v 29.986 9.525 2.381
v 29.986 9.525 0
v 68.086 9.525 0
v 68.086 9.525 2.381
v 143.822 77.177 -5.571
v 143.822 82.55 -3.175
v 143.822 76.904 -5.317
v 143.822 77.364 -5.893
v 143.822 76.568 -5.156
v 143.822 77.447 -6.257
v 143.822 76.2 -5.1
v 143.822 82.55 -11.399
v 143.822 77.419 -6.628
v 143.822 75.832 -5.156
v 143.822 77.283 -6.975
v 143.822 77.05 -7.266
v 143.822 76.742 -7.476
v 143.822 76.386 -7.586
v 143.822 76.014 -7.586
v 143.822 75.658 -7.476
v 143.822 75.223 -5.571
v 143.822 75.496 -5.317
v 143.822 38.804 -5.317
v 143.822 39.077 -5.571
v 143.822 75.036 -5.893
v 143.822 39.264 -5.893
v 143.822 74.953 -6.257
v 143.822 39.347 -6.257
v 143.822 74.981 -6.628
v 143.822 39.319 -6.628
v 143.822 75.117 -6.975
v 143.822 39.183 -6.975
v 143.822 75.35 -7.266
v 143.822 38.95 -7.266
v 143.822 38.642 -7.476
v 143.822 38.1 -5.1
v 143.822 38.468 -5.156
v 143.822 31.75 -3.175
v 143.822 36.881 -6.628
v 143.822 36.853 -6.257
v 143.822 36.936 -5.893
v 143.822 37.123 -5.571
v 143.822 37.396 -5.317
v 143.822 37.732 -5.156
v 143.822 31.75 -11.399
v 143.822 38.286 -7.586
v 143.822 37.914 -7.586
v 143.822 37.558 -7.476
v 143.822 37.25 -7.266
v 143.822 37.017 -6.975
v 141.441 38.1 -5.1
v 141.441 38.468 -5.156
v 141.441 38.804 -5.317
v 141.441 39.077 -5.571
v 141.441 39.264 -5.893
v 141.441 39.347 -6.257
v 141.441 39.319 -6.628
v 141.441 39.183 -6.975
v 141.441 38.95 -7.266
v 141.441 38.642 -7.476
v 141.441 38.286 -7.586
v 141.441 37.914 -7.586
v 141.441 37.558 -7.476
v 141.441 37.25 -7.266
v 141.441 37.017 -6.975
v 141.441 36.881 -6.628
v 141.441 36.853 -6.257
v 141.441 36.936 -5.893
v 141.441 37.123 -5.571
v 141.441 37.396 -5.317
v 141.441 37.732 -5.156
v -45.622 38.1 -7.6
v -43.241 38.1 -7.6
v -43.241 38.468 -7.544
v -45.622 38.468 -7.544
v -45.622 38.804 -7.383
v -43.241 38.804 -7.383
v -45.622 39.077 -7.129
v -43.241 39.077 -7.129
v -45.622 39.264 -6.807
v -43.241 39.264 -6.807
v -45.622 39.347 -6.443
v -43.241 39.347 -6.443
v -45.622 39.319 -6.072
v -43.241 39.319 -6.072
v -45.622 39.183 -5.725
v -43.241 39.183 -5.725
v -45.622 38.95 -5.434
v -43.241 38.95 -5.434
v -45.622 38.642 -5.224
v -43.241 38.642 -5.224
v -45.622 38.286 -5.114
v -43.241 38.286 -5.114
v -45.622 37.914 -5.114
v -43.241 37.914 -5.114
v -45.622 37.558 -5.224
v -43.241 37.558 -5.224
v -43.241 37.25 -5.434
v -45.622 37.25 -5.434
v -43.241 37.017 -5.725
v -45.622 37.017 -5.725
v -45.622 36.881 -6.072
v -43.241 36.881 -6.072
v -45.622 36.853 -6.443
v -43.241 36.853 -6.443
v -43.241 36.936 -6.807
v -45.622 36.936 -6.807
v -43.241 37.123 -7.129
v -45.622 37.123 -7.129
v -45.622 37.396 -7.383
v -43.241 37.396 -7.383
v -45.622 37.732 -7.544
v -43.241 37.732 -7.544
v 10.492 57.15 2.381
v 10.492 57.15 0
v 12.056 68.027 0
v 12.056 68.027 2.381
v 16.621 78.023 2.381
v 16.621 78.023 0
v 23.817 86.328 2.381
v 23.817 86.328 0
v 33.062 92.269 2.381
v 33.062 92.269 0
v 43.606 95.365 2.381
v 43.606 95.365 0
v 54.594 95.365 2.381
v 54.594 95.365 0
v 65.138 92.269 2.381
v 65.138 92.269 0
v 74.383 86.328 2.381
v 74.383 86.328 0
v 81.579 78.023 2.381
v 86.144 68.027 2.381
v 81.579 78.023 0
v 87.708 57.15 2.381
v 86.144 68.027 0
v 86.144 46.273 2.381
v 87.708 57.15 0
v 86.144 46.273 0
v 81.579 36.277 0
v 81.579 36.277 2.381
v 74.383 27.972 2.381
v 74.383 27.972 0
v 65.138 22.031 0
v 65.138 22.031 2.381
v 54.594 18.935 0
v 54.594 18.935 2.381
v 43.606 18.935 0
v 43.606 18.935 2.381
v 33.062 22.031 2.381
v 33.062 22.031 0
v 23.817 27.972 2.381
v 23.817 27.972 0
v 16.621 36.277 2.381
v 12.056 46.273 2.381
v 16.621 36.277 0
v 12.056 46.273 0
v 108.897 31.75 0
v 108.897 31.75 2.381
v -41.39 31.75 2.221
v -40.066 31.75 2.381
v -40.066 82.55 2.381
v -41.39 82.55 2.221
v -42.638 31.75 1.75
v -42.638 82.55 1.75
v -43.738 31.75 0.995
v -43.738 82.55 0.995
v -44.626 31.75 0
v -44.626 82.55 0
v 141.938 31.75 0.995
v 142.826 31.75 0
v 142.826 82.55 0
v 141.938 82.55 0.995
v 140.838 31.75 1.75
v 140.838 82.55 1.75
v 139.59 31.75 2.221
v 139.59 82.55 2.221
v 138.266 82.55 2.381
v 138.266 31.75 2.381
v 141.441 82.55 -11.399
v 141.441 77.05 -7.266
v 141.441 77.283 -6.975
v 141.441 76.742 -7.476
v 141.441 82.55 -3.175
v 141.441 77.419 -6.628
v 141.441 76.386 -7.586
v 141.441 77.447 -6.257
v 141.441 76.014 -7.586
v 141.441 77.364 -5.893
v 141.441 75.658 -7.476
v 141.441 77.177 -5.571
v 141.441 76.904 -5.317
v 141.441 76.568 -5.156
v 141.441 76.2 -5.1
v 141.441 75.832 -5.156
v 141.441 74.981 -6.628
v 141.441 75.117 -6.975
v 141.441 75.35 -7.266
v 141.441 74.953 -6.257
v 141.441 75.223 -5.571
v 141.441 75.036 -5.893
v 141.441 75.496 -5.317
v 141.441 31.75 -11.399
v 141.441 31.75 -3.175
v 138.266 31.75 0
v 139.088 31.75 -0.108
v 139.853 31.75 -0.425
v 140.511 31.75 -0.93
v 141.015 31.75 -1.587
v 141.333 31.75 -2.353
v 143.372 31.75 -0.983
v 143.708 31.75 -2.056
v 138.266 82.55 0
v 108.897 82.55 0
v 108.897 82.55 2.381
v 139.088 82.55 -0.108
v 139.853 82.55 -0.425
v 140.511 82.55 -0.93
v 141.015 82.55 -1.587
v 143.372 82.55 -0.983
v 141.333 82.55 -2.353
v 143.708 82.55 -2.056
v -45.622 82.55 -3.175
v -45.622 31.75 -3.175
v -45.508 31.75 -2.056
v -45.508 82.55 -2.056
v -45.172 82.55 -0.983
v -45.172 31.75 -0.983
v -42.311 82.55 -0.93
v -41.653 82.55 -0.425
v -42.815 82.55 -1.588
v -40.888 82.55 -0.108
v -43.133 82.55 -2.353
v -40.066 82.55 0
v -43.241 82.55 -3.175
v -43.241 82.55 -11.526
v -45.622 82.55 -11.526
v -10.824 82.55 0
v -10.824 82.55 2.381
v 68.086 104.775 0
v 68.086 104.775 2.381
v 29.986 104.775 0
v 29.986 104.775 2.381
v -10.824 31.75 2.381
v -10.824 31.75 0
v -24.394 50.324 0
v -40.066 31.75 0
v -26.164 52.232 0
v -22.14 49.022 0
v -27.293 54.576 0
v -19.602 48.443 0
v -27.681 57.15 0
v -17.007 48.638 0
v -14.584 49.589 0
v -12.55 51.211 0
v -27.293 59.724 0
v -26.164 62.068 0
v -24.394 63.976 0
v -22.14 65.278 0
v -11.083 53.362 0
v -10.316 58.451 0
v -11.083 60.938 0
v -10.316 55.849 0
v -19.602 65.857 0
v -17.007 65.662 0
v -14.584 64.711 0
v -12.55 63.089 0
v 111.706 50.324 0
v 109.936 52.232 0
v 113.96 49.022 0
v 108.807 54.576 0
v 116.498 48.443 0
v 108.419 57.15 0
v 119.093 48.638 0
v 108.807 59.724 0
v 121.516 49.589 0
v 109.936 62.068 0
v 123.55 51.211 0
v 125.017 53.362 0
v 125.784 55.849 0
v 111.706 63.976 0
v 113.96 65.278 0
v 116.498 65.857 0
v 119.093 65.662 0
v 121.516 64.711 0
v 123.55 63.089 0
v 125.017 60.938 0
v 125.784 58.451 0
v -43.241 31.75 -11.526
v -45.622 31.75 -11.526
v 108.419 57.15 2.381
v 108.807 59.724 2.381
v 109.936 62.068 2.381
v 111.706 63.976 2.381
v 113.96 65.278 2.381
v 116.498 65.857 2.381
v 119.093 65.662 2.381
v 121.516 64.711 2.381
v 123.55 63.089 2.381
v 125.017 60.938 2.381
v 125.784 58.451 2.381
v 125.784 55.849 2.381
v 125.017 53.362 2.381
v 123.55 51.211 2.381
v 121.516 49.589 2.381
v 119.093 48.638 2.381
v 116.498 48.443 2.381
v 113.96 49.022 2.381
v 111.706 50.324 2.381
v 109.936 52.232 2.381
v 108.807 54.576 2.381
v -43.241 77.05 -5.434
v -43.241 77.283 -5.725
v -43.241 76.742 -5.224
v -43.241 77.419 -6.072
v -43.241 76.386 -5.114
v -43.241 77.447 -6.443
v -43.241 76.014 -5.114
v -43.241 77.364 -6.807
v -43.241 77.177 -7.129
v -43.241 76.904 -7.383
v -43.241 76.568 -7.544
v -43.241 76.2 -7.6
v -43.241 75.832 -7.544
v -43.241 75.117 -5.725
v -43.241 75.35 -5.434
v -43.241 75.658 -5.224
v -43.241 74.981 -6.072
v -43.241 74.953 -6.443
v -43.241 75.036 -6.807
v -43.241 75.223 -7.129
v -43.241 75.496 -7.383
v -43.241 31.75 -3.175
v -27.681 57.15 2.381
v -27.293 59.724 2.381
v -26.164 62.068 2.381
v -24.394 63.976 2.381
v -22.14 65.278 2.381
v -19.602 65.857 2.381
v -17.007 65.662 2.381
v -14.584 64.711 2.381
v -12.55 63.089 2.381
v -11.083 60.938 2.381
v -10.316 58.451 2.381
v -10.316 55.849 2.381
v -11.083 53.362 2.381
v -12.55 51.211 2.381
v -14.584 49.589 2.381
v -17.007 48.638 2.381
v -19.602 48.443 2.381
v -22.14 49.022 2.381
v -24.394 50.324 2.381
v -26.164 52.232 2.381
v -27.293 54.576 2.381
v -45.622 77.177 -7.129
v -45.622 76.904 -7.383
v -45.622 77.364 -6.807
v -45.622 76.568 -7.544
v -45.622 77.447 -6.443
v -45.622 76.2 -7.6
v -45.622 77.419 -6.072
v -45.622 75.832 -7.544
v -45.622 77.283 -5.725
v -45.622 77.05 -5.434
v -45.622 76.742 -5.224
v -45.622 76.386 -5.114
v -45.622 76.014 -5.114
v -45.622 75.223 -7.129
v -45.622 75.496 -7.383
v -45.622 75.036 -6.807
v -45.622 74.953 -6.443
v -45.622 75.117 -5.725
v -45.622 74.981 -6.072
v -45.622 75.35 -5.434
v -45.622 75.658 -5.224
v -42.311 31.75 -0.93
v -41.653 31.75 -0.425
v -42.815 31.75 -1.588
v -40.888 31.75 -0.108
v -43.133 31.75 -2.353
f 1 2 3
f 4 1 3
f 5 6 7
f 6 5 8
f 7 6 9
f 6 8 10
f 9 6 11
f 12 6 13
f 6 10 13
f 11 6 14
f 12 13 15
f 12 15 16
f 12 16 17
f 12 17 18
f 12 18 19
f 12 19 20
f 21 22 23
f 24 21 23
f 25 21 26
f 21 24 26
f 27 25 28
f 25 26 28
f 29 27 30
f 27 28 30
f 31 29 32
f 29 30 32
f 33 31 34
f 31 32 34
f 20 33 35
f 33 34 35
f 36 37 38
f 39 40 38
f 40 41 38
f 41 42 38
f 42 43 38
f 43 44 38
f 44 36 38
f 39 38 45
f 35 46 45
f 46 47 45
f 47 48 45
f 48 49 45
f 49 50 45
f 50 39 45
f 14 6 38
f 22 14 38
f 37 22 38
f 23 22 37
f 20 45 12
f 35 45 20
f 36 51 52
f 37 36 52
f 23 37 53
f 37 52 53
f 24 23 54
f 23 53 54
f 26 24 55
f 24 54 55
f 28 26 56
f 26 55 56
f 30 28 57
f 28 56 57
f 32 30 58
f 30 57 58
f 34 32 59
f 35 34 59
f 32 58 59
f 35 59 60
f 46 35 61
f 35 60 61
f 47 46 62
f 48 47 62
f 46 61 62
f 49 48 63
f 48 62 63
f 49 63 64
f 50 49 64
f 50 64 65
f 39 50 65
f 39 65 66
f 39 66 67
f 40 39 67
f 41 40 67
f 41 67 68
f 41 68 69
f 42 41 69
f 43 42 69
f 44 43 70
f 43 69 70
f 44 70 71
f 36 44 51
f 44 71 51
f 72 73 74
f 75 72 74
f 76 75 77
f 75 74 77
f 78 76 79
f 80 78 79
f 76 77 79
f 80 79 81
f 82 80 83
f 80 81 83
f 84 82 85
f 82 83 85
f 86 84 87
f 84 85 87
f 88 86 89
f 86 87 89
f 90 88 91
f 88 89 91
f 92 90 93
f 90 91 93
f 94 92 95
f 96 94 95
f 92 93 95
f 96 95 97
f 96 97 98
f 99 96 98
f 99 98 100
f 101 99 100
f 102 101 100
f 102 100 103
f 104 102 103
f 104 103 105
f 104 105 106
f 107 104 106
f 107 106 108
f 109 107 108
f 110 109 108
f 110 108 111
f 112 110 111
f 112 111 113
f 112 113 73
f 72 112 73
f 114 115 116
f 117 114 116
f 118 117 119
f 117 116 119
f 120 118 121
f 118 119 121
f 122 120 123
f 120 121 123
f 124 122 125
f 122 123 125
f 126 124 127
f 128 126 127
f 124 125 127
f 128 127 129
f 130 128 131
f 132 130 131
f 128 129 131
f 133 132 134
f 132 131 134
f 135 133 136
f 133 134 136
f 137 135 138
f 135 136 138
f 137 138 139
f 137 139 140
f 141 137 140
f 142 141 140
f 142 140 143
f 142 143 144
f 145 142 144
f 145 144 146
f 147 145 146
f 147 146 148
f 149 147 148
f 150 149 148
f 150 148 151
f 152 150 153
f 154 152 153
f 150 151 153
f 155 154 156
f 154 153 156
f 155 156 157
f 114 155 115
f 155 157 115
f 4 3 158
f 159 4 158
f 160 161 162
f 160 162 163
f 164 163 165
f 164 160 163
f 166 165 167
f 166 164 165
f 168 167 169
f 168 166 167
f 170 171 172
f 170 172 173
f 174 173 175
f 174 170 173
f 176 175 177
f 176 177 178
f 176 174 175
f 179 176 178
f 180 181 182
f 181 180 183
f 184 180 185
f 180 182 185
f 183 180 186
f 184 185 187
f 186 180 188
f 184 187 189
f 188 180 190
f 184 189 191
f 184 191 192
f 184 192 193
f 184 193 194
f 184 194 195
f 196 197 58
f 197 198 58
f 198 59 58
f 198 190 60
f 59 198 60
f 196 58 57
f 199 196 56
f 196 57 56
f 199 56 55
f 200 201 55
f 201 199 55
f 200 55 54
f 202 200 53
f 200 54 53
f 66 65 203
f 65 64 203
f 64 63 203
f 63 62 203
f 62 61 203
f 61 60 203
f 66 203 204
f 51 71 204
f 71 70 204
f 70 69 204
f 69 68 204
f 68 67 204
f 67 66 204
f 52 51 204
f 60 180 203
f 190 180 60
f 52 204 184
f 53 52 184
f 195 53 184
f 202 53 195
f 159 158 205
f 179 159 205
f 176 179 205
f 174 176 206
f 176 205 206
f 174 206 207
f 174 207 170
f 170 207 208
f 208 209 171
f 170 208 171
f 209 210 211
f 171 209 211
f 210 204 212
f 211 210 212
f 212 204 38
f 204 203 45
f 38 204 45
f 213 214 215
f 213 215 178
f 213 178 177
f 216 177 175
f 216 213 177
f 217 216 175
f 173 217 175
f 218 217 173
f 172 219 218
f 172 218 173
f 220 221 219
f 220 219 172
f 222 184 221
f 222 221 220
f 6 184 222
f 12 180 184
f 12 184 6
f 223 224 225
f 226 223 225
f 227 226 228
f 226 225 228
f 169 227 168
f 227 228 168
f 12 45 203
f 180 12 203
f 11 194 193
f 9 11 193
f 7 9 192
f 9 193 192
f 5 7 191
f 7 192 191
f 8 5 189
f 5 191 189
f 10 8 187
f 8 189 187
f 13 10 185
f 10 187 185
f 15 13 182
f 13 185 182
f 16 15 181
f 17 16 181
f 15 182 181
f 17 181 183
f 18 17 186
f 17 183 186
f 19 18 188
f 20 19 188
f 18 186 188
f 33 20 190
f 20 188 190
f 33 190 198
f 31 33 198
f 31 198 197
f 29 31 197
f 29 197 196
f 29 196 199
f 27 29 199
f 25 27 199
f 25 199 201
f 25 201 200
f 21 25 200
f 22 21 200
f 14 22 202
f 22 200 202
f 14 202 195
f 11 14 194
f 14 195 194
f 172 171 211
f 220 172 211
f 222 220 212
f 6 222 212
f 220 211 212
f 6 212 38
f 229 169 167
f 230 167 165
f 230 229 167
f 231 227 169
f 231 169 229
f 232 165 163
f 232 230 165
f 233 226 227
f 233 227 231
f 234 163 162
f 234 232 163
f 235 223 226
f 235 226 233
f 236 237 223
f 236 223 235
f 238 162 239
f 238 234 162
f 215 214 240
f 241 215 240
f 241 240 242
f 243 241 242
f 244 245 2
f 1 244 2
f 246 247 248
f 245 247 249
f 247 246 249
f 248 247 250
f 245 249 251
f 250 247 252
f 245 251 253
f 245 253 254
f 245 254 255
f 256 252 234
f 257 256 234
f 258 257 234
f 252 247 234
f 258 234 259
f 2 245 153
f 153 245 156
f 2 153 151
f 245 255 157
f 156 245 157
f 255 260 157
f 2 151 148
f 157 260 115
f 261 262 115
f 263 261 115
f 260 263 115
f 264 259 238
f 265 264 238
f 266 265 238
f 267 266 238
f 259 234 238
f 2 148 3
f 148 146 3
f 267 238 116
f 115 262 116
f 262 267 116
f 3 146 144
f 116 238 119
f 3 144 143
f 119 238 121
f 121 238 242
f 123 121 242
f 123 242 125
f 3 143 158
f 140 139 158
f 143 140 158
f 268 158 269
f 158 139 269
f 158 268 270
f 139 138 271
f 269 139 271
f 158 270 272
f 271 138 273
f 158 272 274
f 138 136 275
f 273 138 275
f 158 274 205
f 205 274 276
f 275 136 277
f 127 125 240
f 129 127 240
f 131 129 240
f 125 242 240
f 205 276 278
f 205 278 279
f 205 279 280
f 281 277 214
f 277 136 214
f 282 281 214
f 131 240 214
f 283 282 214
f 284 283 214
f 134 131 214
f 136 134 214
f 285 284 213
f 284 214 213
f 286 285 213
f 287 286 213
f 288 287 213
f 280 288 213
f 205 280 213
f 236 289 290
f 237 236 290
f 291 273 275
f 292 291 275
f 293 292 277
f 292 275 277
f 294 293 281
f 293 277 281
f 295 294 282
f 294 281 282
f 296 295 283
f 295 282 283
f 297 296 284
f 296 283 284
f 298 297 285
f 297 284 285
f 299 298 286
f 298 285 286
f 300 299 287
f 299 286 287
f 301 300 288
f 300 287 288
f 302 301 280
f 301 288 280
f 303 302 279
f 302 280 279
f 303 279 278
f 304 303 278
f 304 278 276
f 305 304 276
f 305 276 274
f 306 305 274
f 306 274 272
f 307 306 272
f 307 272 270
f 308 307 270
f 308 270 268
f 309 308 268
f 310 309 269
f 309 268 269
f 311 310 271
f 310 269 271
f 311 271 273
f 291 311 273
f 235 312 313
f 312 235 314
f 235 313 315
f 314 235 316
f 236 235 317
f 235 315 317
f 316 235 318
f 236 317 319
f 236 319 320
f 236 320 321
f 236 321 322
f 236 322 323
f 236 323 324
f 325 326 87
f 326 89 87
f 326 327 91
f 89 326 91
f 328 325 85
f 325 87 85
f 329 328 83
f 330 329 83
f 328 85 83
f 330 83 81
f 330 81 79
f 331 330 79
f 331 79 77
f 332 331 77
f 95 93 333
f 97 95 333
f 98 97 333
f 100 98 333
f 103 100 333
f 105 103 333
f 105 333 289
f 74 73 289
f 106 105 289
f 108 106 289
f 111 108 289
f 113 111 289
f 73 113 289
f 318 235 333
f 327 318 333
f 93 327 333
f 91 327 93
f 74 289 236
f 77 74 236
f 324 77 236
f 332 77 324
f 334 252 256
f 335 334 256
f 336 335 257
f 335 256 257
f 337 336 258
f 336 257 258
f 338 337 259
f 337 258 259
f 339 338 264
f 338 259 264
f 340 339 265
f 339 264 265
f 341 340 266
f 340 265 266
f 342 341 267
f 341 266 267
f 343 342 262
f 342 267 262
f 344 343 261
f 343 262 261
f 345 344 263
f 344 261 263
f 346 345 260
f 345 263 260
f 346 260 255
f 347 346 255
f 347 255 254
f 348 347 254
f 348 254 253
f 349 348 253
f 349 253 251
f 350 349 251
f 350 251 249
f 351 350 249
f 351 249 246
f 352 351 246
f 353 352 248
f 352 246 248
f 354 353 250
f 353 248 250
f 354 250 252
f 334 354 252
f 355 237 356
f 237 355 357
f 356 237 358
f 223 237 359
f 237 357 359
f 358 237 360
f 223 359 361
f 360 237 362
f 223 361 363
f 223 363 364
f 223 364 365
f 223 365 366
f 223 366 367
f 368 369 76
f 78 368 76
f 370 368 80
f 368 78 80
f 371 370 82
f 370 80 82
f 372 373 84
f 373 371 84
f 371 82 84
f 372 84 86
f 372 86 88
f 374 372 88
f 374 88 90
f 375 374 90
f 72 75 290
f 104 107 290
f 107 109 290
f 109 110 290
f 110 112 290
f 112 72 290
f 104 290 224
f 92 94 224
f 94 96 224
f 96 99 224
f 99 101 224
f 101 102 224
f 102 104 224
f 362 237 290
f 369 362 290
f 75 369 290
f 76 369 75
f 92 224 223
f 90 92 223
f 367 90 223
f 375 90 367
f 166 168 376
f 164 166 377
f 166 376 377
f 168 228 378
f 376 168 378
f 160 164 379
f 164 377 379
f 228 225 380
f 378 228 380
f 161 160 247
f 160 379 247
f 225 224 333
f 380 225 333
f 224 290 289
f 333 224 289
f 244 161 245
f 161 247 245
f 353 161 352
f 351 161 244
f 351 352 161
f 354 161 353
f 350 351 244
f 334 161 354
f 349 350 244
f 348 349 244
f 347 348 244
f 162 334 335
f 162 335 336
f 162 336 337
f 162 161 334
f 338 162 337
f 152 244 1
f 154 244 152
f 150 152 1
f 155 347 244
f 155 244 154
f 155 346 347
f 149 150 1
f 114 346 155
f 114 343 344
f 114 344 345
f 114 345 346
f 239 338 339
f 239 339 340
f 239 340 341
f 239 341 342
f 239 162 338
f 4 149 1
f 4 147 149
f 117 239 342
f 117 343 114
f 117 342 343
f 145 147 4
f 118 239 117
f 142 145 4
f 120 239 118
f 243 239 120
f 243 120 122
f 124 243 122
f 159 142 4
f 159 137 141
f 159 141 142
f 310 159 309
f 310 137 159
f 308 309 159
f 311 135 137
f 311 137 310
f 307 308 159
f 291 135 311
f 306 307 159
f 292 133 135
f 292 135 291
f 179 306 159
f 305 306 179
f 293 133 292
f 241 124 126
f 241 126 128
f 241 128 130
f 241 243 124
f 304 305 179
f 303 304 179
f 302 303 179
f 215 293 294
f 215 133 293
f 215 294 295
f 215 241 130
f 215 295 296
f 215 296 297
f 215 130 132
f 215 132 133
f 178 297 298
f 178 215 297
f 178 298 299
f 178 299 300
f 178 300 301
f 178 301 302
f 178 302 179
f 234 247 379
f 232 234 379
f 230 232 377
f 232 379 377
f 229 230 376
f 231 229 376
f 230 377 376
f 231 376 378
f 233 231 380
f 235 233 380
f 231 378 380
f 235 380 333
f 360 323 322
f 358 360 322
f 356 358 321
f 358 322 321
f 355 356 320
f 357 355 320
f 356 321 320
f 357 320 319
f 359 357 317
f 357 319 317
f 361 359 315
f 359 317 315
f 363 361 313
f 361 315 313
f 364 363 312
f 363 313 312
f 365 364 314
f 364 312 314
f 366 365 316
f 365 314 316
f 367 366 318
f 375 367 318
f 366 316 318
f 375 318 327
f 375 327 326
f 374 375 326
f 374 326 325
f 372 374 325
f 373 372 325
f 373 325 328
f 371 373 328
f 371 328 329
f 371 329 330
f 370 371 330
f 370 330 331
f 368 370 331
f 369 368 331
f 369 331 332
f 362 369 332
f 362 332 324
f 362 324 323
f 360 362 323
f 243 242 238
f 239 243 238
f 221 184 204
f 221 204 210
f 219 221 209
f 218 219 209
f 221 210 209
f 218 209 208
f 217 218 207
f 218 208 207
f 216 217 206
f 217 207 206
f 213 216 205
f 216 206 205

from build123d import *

# Parameters (mm, degrees)
BOSS_EXTRUDE1_DEPTH             = 2.38125
SKETCH2_R                       = 38.608
SKETCH2_R_2                     = 8.73125
CUT_EXTRUDE1_DEPTH              = 2.38125
SKETCHED_START                  = 31.75
SKETCHED_BEND1_DEPTH            = 50.8
SKETCHED_BEND1_2_DEPTH          = 50.8
SKETCHED_BEND2_DEPTH            = 50.8
SKETCHED_BEND2_2_DEPTH          = 50.8
TAP_DRILL_FOR_M3X0_5_TAP1_D     = 2.5
TAP_DRILL_FOR_M3X0_5_TAP1_DEPTH = 2.38125
TAP_DRILL_FOR_M3X0_5_TAP2_D     = 2.5


# Read off the part's stored shape, not the designer's step: Sketched Bend1, Sketched Bend2
with BuildPart() as part:
    # Sketch1 → Boss-Extrude1 (new body)
    with BuildSketch(Plane.XY):
        Polygon((-55.274119317, 31.75), (-10.824119317, 31.75), (29.9865, 9.525), (68.0865, 9.525), (108.897119317, 31.75), (153.347119317, 31.75), (153.347119317, 82.55), (108.897119317, 82.55), (68.0865, 104.775), (29.9865, 104.775), (-10.824119317, 82.55), (-55.274119317, 82.55), align=None)
    extrude(amount=BOSS_EXTRUDE1_DEPTH)

    # Sketch2 → Cut-Extrude1 (cut)
    with BuildSketch(Plane(origin=(0, 0, 0), x_dir=(-1, 0, 0), z_dir=(0, 0, -1))):
        with Locations((-49.1, 57.15)):
            Circle(SKETCH2_R)
        with Locations((-117.15, 57.15)):
            Circle(SKETCH2_R_2)
        with Locations((18.95, 57.15)):
            Circle(SKETCH2_R_2)
    extrude(amount=-CUT_EXTRUDE1_DEPTH, mode=Mode.SUBTRACT)

    # Sketched Bend1 outline → Sketched Bend1 (cut)
    with BuildSketch(Plane(origin=(0, 0, 0), x_dir=(1, 0, 0), z_dir=(0, 1, 0)).offset(SKETCHED_START)):
        with BuildLine():
            Line((153.347119317, 0), (142.825615918, 0))
            ThreePointArc((142.825615918, 0), (140.837913282, -1.750089228), (138.265869317, -2.38125))
            Line((138.265869317, -2.38125), (153.347119317, -2.38125))
            Line((153.347119317, -2.38125), (153.347119317, 0))
        make_face()
    extrude(amount=SKETCHED_BEND1_DEPTH, mode=Mode.SUBTRACT)

    # Sketched Bend1 2 outline → Sketched Bend1 2 (add)
    with BuildSketch(Plane(origin=(0, 0, 0), x_dir=(1, 0, 0), z_dir=(0, 1, 0)).offset(SKETCHED_START)):
        with BuildLine():
            Line((143.822119317, 3.175), (143.822119317, 11.398742286))
            Line((143.822119317, 11.398742286), (141.440869317, 11.398742286))
            Line((141.440869317, 11.398742286), (141.440869317, 3.175))
            ThreePointArc((141.440869317, 3.175), (140.510933348, 0.929935969), (138.265869317, 0))
            Line((138.265869317, 0), (142.825615918, 0))
            ThreePointArc((142.825615918, 0), (143.567143037, 1.511145738), (143.822119317, 3.175))
        make_face()
    extrude(amount=SKETCHED_BEND1_2_DEPTH)

    # Sketched Bend2 outline → Sketched Bend2 (cut)
    with BuildSketch(Plane(origin=(0, 0, 0), x_dir=(1, 0, 0), z_dir=(0, 1, 0)).offset(SKETCHED_START)):
        with BuildLine():
            ThreePointArc((-40.065869317, -2.38125), (-42.637913282, -1.750089228), (-44.625615918, 0))
            Line((-44.625615918, 0), (-55.274119317, 0))
            Line((-55.274119317, 0), (-55.274119317, -2.38125))
            Line((-55.274119317, -2.38125), (-40.065869317, -2.38125))
        make_face()
    extrude(amount=SKETCHED_BEND2_DEPTH, mode=Mode.SUBTRACT)

    # Sketched Bend2 2 outline → Sketched Bend2 2 (add)
    with BuildSketch(Plane(origin=(0, 0, 0), x_dir=(1, 0, 0), z_dir=(0, 1, 0)).offset(SKETCHED_START)):
        with BuildLine():
            ThreePointArc((-40.065869317, 0), (-42.310933347, 0.92993597), (-43.240869317, 3.175))
            Line((-43.240869317, 3.175), (-43.240869317, 11.525742286))
            Line((-43.240869317, 11.525742286), (-45.622119317, 11.525742286))
            Line((-45.622119317, 11.525742286), (-45.622119317, 3.175))
            ThreePointArc((-45.622119317, 3.175), (-45.367143037, 1.511145738), (-44.625615918, 0))
            Line((-44.625615918, 0), (-40.065869317, 0))
        make_face()
    extrude(amount=SKETCHED_BEND2_2_DEPTH)

    # Tap Drill for M3x0.5 Tap1
    with Locations(Plane(origin=(143.822119317, 0, 0), x_dir=(0, 0, -1), z_dir=(1, 0, 0))):
        with Locations((6.35, 76.2), (6.35, 38.1)):
            Hole(TAP_DRILL_FOR_M3X0_5_TAP1_D / 2, depth=TAP_DRILL_FOR_M3X0_5_TAP1_DEPTH)

    # Tap Drill for M3x0.5 Tap2 (through all)
    with Locations(Plane.ZY.offset(45.622119317)):
        with Locations((-6.35, 76.2), (-6.35, 38.1)):
            Hole(TAP_DRILL_FOR_M3X0_5_TAP2_D / 2)


solid = part.part
